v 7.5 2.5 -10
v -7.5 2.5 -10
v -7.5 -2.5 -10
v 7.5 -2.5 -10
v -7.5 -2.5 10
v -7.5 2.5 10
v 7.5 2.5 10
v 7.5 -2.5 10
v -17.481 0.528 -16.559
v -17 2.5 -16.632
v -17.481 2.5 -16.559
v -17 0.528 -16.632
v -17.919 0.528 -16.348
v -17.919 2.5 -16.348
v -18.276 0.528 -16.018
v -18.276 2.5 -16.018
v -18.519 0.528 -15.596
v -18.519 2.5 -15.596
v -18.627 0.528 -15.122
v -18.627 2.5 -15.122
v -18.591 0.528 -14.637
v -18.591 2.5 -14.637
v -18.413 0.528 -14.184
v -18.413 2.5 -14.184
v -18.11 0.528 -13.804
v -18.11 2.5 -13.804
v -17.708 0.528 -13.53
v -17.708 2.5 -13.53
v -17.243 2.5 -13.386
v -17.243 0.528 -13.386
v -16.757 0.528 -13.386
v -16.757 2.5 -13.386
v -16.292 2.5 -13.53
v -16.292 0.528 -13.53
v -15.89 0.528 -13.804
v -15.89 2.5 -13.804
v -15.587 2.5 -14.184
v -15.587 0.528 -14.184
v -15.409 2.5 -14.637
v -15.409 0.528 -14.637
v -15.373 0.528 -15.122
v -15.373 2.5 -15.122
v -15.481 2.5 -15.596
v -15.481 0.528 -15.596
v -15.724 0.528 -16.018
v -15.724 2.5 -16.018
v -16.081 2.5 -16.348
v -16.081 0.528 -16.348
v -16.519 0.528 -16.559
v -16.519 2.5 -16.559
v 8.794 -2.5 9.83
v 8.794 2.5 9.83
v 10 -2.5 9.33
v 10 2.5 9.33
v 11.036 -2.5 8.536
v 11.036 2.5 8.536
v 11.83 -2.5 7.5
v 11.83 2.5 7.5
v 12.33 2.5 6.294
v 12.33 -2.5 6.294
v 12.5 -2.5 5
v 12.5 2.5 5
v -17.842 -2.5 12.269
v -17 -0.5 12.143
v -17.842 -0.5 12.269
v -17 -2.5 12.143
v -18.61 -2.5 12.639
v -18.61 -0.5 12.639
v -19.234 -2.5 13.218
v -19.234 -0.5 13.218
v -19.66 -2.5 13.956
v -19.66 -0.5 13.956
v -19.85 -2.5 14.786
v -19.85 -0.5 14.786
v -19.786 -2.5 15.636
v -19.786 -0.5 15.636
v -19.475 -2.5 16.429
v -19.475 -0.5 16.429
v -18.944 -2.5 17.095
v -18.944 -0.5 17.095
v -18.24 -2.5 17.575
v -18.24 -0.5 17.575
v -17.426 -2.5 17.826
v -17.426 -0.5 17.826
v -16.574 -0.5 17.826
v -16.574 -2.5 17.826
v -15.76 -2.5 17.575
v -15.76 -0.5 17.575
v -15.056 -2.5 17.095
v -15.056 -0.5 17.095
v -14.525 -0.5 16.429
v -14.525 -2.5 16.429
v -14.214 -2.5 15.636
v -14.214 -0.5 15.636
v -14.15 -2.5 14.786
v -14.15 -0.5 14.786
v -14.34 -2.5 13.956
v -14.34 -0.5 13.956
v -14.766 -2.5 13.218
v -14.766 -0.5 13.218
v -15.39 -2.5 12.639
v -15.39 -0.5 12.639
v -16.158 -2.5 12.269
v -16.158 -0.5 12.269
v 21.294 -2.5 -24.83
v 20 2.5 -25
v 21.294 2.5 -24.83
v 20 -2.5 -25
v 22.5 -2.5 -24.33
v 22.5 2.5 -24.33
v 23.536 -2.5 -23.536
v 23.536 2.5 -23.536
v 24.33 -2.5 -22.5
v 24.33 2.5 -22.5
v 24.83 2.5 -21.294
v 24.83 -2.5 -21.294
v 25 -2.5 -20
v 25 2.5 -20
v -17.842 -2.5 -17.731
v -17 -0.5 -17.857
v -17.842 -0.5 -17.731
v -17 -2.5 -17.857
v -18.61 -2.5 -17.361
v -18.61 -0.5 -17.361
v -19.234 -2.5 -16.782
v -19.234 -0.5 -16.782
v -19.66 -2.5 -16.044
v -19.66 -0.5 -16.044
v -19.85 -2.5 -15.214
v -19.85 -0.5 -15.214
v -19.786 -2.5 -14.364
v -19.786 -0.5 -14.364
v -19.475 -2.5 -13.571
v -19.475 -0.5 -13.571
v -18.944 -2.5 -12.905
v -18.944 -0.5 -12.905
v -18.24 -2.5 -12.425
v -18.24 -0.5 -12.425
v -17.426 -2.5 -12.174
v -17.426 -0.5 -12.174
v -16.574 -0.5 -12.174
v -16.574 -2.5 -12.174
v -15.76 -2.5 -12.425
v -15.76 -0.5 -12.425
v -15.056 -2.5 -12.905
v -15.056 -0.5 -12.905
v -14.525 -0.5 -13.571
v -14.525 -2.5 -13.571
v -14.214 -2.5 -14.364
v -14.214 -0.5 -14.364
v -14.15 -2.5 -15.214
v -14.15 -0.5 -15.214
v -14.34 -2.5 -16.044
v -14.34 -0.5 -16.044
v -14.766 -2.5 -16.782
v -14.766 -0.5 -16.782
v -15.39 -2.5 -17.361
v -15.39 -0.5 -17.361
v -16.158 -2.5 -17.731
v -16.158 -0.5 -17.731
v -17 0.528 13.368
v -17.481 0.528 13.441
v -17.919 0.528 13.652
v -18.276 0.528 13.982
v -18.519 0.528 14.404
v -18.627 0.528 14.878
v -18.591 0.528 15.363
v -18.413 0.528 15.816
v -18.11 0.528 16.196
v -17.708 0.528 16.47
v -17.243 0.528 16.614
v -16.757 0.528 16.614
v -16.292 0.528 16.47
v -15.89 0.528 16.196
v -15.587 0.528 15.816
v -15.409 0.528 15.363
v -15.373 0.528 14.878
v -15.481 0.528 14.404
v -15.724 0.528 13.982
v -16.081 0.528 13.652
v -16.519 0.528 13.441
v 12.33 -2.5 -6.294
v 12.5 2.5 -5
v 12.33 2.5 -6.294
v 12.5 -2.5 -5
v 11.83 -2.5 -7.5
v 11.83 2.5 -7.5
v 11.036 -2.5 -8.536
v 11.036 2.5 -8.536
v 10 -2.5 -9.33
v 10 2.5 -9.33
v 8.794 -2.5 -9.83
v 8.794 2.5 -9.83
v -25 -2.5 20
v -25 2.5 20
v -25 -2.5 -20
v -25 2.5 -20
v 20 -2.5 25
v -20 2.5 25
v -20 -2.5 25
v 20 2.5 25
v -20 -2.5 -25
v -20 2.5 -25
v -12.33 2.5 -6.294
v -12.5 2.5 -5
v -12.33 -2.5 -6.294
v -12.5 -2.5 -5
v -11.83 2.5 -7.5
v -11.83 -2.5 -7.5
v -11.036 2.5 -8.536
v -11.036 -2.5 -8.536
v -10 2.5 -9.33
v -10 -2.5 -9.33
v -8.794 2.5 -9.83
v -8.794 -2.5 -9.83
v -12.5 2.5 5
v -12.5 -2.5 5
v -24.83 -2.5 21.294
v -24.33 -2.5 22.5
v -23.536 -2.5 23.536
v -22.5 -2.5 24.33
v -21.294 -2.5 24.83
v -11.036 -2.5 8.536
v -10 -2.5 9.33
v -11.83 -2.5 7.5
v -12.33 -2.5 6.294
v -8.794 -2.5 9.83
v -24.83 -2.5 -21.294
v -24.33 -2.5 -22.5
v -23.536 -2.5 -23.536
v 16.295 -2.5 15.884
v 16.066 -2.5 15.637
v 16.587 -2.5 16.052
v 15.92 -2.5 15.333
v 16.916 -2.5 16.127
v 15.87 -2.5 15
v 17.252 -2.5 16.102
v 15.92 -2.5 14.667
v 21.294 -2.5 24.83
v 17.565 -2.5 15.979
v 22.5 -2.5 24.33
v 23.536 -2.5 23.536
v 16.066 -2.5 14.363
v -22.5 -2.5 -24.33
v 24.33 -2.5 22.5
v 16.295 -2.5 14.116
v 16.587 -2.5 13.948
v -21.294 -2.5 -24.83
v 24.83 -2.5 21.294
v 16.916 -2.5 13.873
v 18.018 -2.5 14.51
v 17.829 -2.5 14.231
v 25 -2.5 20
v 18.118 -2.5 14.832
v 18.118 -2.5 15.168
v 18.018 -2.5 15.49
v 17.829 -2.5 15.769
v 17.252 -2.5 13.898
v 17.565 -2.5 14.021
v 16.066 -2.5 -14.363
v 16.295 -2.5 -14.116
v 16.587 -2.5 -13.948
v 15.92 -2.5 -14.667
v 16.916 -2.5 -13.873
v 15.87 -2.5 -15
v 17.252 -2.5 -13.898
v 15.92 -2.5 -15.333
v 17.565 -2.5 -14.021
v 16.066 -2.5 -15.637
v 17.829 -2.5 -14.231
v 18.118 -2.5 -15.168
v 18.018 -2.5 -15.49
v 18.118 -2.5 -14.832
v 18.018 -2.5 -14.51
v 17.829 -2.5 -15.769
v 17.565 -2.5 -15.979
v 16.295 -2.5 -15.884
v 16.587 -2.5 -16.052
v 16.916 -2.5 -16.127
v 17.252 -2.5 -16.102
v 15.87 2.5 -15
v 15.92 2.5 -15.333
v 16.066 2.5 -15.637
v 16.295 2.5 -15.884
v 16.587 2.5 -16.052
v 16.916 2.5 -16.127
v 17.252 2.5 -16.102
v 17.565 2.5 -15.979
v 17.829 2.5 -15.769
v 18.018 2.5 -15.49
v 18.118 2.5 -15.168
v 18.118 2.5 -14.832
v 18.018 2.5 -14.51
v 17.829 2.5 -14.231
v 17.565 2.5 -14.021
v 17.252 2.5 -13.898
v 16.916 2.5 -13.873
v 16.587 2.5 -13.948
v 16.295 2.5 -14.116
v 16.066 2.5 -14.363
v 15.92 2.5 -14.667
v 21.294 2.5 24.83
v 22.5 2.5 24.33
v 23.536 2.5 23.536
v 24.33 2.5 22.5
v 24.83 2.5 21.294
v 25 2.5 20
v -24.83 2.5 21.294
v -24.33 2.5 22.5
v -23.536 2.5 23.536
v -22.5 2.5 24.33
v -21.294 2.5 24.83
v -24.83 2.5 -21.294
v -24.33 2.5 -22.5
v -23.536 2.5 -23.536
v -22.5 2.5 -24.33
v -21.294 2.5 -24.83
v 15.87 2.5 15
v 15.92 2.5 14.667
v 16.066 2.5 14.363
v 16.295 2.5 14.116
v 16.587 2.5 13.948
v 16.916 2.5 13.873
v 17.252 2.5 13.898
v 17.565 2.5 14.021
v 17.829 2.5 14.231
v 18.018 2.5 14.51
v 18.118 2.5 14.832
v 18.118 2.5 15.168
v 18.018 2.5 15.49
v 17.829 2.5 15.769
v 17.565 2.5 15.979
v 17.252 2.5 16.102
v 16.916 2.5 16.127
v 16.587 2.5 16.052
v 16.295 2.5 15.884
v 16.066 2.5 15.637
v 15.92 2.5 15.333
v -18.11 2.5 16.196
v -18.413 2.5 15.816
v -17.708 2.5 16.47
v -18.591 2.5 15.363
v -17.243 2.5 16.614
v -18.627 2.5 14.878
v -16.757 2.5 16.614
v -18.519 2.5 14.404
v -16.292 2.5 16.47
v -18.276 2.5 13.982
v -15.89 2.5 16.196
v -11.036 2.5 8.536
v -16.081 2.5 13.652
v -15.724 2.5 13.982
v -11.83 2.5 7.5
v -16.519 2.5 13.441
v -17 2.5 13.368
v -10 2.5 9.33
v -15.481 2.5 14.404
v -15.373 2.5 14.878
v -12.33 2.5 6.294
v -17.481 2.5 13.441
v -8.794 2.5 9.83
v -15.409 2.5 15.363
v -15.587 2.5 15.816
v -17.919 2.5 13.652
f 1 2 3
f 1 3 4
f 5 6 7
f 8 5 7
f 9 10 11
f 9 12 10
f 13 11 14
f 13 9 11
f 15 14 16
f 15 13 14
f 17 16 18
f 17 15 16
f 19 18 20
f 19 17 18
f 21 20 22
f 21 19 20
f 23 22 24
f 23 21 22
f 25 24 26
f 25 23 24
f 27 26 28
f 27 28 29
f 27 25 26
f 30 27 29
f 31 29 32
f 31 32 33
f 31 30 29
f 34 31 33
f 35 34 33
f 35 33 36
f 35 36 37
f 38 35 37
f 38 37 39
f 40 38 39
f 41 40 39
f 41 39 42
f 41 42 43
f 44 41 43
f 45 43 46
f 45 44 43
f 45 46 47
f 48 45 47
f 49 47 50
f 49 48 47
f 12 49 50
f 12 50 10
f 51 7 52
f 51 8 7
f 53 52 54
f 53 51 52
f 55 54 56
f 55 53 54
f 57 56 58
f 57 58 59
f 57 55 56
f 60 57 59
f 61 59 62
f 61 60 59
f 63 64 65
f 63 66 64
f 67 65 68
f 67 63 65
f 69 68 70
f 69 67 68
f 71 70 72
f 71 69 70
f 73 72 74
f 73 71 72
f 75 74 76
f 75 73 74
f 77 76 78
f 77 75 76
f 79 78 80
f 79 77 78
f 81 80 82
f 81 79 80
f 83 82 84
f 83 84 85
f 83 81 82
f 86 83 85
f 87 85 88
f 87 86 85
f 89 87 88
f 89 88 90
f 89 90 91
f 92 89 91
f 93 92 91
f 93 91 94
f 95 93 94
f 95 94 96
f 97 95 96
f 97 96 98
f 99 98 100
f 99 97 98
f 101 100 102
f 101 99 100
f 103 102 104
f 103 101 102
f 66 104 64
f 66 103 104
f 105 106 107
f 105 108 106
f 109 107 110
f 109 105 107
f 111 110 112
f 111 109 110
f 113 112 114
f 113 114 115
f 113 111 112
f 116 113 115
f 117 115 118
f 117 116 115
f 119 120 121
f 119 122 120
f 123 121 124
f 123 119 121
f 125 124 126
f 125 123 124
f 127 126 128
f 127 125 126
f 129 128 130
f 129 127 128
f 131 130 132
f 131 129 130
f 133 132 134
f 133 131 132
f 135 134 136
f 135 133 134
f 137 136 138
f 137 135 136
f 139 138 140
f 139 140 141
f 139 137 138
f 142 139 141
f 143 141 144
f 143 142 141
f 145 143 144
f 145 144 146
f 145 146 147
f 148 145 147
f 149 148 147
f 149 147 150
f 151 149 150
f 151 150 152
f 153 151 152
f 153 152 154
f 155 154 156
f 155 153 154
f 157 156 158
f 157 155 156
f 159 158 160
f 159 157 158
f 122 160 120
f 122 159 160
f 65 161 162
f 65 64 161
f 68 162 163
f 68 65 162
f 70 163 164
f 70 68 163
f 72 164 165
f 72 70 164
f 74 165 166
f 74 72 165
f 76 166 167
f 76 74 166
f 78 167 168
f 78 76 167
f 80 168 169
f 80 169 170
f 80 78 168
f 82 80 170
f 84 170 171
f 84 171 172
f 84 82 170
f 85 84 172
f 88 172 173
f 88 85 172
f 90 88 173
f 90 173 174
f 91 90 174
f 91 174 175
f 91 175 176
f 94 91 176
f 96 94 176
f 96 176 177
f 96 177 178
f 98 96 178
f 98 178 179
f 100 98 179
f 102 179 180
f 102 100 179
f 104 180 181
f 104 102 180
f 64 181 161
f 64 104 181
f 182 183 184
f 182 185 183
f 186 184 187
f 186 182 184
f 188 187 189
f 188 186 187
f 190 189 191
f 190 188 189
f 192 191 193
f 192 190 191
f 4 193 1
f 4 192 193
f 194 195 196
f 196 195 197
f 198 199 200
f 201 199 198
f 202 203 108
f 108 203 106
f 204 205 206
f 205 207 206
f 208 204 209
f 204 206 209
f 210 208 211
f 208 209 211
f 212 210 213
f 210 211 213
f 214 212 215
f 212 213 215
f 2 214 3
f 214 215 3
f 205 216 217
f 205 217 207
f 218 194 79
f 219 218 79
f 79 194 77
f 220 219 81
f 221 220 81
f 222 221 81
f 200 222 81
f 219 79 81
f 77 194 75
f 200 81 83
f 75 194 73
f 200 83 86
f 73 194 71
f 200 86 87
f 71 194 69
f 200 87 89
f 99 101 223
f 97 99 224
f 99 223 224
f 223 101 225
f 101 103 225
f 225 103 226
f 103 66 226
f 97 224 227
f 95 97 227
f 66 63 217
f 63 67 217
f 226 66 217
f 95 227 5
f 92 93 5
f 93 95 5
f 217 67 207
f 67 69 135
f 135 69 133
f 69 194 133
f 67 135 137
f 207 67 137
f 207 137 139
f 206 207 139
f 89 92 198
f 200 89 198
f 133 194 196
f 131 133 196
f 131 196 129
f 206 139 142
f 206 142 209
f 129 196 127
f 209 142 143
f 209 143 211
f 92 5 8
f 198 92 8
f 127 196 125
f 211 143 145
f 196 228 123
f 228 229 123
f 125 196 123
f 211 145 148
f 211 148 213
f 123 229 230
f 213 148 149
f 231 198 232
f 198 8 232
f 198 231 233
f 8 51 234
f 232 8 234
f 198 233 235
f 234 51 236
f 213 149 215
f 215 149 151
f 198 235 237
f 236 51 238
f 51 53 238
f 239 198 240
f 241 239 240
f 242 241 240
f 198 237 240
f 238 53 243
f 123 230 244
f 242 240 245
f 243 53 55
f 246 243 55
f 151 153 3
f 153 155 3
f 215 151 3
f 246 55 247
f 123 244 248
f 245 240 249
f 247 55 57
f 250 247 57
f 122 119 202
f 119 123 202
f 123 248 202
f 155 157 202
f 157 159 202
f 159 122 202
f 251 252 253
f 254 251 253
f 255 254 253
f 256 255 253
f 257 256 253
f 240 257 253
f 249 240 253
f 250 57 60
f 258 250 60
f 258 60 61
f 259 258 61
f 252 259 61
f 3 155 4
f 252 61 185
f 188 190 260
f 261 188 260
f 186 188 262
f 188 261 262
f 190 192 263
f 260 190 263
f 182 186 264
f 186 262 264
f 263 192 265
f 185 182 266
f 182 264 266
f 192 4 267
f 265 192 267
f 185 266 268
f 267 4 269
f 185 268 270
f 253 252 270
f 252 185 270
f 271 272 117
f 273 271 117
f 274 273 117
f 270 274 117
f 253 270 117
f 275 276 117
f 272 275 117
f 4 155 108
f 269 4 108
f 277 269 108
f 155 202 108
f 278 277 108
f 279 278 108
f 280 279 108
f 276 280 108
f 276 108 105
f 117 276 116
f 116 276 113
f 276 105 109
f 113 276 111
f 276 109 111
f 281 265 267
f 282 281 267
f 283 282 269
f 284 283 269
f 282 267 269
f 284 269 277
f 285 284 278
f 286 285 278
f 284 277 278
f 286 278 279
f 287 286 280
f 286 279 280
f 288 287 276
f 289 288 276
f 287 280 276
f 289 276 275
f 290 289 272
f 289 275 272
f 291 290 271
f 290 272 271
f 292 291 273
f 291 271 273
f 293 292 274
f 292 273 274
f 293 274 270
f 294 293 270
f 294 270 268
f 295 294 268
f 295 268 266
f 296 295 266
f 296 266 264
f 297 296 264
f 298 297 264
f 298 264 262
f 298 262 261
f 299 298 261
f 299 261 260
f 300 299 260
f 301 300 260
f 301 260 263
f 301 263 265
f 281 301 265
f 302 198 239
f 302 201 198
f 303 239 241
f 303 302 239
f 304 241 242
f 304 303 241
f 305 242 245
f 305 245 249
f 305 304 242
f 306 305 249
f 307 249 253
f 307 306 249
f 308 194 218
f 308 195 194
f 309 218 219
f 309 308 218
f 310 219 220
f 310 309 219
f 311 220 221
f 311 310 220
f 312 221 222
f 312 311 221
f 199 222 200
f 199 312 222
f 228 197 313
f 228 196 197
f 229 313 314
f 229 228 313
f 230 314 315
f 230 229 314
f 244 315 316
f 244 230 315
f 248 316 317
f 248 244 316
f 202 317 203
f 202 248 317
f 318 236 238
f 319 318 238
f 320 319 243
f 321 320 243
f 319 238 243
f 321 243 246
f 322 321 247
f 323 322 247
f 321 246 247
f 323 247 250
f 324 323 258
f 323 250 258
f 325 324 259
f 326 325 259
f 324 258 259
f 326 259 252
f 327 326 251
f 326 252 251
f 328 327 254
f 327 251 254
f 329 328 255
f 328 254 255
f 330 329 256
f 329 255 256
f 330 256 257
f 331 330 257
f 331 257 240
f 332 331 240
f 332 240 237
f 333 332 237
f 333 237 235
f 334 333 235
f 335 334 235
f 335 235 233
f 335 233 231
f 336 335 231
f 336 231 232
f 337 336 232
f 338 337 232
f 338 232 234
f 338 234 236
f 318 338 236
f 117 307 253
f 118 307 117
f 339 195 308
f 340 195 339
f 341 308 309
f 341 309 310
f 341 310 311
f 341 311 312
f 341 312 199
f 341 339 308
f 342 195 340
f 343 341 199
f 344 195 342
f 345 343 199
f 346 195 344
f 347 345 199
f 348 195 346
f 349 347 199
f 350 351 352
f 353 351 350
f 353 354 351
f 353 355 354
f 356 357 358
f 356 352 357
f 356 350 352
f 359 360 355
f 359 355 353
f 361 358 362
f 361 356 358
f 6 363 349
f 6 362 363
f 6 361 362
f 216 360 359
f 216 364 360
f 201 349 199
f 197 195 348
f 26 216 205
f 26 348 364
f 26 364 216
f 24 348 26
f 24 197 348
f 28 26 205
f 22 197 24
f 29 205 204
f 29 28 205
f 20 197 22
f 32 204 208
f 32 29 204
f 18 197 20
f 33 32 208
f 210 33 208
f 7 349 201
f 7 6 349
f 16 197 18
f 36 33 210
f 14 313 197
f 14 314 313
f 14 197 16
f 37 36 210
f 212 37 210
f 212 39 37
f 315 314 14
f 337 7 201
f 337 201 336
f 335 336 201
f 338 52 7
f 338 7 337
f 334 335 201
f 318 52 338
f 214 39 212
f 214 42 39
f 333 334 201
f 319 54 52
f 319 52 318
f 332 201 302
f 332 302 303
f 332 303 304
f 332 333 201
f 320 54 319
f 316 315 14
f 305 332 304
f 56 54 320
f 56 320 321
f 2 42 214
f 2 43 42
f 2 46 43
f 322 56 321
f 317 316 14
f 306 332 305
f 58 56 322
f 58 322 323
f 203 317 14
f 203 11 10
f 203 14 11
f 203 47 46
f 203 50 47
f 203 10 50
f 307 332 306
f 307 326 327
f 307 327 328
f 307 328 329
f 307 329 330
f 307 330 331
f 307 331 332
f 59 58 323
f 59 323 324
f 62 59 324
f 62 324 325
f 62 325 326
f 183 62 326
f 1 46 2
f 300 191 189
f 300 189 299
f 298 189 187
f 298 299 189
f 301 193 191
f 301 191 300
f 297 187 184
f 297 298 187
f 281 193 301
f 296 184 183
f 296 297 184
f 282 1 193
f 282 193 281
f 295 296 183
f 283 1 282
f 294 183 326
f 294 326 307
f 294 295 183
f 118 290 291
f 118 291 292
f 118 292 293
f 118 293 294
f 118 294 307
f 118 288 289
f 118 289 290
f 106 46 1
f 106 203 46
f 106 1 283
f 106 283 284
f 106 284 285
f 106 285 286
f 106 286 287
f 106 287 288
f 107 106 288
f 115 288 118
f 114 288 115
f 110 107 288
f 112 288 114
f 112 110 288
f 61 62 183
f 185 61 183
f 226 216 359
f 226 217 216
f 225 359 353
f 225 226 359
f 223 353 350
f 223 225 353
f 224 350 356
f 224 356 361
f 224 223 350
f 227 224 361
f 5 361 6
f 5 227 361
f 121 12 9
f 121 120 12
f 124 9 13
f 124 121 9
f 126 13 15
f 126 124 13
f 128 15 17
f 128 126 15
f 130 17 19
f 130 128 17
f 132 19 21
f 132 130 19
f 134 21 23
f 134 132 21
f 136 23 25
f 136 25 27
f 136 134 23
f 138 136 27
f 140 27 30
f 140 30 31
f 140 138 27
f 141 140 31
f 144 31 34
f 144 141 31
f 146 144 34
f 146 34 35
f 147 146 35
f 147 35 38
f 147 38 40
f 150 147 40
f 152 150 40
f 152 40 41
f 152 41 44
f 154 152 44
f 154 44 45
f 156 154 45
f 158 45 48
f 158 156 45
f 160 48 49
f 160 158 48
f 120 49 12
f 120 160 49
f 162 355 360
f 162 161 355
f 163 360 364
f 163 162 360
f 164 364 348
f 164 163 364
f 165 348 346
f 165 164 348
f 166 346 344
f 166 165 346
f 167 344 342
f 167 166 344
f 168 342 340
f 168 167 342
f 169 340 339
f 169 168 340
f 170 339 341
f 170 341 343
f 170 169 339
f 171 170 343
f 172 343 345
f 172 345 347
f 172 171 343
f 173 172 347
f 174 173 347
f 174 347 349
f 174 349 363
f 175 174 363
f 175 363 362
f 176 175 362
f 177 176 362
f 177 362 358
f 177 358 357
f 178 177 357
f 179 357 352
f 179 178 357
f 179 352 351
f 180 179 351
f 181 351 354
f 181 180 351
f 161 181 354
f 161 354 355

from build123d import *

# Parameters (mm, degrees)
SKETCH1_W                                 = 50
SKETCH1_H                                 = 50
BOSS_EXTRUDE1_DEPTH                       = 2.5
F_4_40_TAPPED_HOLE1_D                     = 2.2606
F_4_40_TAPPED_HOLE1_DEPTH                 = 5
CSK_FOR_4_FLAT_HEAD_MACHINE_SCREW_2_COUNT = 2
CSK_FOR_4_FLAT_HEAD_MACHINE_SCREW_2_PITCH = 30
CUT_EXTRUDE1_REACH                        = 7
SKETCH6_W                                 = 25
SKETCH6_H                                 = 20
FILLET1_R                                 = 5


with BuildPart() as part:
    # Sketch1 → Boss-Extrude1 (new body, symmetric)
    with BuildSketch(Plane(origin=(0, 0, 0), x_dir=(1, 0, 0), z_dir=(0, 1, 0))):
        Rectangle(SKETCH1_W, SKETCH1_H)
    extrude(amount=BOSS_EXTRUDE1_DEPTH, both=True)

    # #4-40 Tapped Hole1
    with Locations(Plane(origin=(0, 2.5, 0), x_dir=(1, 0, 0), z_dir=(0, 1, 0))):
        with Locations((17, 15), (17, -15)):
            Hole(F_4_40_TAPPED_HOLE1_D / 2, depth=F_4_40_TAPPED_HOLE1_DEPTH)

    # Sketch5 → CSK for #4 Flat Head Machine Screw (100)1 (revolve, cut)
    with BuildSketch(Plane(origin=(-17, -2.5, -15), x_dir=(0, 0, -1), z_dir=(1, 0, 0))):
        Polygon((0, 0), (0, 5), (1.63195, 5), (1.63195, 3.028350774), (2.857490729, 2), (2.857490729, 0), align=None)
    csk_for_4_flat_head_machine_screw_100 = revolve(axis=Axis((-17, -8.85, -15), (0, 1, 0)), mode=Mode.SUBTRACT)

    # CSK for _4 Flat Head Machine Screw _ 2: CSK for #4 Flat Head Machine Screw (100)1 ×2
    with Locations(*[(0, 0, i * CSK_FOR_4_FLAT_HEAD_MACHINE_SCREW_2_PITCH) for i in range(1, CSK_FOR_4_FLAT_HEAD_MACHINE_SCREW_2_COUNT)]):
        add(csk_for_4_flat_head_machine_screw_100, mode=Mode.SUBTRACT)

    # Sketch6 → Cut-Extrude1 (cut, up to next)
    with BuildSketch(Plane(origin=(0, 2.5, 0), x_dir=(1, 0, 0), z_dir=(0, 1, 0)), mode=Mode.PRIVATE) as cut_extrude1_sk1:
        Rectangle(SKETCH6_W, SKETCH6_H)
    cut_extrude1_tool1 = extrude(cut_extrude1_sk1.sketch, amount=-CUT_EXTRUDE1_REACH, mode=Mode.PRIVATE) & part.part
    add(cut_extrude1_tool1.solids().sort_by_distance((0, 2.5, 0))[0], mode=Mode.SUBTRACT)

    # Fillet1
    fillet1_edges = [part.edges().sort_by_distance(p)[0] for p in [
        (12.5, 0, -10),
        (12.5, 0, 10),
        (-12.5, 0, 10),
        (-12.5, 0, -10),
        (-25, 0, -25),
        (25, 0, -25),
        (25, 0, 25),
        (-25, 0, 25),
    ]]
    fillet(fillet1_edges, radius=FILLET1_R)


solid = part.part
